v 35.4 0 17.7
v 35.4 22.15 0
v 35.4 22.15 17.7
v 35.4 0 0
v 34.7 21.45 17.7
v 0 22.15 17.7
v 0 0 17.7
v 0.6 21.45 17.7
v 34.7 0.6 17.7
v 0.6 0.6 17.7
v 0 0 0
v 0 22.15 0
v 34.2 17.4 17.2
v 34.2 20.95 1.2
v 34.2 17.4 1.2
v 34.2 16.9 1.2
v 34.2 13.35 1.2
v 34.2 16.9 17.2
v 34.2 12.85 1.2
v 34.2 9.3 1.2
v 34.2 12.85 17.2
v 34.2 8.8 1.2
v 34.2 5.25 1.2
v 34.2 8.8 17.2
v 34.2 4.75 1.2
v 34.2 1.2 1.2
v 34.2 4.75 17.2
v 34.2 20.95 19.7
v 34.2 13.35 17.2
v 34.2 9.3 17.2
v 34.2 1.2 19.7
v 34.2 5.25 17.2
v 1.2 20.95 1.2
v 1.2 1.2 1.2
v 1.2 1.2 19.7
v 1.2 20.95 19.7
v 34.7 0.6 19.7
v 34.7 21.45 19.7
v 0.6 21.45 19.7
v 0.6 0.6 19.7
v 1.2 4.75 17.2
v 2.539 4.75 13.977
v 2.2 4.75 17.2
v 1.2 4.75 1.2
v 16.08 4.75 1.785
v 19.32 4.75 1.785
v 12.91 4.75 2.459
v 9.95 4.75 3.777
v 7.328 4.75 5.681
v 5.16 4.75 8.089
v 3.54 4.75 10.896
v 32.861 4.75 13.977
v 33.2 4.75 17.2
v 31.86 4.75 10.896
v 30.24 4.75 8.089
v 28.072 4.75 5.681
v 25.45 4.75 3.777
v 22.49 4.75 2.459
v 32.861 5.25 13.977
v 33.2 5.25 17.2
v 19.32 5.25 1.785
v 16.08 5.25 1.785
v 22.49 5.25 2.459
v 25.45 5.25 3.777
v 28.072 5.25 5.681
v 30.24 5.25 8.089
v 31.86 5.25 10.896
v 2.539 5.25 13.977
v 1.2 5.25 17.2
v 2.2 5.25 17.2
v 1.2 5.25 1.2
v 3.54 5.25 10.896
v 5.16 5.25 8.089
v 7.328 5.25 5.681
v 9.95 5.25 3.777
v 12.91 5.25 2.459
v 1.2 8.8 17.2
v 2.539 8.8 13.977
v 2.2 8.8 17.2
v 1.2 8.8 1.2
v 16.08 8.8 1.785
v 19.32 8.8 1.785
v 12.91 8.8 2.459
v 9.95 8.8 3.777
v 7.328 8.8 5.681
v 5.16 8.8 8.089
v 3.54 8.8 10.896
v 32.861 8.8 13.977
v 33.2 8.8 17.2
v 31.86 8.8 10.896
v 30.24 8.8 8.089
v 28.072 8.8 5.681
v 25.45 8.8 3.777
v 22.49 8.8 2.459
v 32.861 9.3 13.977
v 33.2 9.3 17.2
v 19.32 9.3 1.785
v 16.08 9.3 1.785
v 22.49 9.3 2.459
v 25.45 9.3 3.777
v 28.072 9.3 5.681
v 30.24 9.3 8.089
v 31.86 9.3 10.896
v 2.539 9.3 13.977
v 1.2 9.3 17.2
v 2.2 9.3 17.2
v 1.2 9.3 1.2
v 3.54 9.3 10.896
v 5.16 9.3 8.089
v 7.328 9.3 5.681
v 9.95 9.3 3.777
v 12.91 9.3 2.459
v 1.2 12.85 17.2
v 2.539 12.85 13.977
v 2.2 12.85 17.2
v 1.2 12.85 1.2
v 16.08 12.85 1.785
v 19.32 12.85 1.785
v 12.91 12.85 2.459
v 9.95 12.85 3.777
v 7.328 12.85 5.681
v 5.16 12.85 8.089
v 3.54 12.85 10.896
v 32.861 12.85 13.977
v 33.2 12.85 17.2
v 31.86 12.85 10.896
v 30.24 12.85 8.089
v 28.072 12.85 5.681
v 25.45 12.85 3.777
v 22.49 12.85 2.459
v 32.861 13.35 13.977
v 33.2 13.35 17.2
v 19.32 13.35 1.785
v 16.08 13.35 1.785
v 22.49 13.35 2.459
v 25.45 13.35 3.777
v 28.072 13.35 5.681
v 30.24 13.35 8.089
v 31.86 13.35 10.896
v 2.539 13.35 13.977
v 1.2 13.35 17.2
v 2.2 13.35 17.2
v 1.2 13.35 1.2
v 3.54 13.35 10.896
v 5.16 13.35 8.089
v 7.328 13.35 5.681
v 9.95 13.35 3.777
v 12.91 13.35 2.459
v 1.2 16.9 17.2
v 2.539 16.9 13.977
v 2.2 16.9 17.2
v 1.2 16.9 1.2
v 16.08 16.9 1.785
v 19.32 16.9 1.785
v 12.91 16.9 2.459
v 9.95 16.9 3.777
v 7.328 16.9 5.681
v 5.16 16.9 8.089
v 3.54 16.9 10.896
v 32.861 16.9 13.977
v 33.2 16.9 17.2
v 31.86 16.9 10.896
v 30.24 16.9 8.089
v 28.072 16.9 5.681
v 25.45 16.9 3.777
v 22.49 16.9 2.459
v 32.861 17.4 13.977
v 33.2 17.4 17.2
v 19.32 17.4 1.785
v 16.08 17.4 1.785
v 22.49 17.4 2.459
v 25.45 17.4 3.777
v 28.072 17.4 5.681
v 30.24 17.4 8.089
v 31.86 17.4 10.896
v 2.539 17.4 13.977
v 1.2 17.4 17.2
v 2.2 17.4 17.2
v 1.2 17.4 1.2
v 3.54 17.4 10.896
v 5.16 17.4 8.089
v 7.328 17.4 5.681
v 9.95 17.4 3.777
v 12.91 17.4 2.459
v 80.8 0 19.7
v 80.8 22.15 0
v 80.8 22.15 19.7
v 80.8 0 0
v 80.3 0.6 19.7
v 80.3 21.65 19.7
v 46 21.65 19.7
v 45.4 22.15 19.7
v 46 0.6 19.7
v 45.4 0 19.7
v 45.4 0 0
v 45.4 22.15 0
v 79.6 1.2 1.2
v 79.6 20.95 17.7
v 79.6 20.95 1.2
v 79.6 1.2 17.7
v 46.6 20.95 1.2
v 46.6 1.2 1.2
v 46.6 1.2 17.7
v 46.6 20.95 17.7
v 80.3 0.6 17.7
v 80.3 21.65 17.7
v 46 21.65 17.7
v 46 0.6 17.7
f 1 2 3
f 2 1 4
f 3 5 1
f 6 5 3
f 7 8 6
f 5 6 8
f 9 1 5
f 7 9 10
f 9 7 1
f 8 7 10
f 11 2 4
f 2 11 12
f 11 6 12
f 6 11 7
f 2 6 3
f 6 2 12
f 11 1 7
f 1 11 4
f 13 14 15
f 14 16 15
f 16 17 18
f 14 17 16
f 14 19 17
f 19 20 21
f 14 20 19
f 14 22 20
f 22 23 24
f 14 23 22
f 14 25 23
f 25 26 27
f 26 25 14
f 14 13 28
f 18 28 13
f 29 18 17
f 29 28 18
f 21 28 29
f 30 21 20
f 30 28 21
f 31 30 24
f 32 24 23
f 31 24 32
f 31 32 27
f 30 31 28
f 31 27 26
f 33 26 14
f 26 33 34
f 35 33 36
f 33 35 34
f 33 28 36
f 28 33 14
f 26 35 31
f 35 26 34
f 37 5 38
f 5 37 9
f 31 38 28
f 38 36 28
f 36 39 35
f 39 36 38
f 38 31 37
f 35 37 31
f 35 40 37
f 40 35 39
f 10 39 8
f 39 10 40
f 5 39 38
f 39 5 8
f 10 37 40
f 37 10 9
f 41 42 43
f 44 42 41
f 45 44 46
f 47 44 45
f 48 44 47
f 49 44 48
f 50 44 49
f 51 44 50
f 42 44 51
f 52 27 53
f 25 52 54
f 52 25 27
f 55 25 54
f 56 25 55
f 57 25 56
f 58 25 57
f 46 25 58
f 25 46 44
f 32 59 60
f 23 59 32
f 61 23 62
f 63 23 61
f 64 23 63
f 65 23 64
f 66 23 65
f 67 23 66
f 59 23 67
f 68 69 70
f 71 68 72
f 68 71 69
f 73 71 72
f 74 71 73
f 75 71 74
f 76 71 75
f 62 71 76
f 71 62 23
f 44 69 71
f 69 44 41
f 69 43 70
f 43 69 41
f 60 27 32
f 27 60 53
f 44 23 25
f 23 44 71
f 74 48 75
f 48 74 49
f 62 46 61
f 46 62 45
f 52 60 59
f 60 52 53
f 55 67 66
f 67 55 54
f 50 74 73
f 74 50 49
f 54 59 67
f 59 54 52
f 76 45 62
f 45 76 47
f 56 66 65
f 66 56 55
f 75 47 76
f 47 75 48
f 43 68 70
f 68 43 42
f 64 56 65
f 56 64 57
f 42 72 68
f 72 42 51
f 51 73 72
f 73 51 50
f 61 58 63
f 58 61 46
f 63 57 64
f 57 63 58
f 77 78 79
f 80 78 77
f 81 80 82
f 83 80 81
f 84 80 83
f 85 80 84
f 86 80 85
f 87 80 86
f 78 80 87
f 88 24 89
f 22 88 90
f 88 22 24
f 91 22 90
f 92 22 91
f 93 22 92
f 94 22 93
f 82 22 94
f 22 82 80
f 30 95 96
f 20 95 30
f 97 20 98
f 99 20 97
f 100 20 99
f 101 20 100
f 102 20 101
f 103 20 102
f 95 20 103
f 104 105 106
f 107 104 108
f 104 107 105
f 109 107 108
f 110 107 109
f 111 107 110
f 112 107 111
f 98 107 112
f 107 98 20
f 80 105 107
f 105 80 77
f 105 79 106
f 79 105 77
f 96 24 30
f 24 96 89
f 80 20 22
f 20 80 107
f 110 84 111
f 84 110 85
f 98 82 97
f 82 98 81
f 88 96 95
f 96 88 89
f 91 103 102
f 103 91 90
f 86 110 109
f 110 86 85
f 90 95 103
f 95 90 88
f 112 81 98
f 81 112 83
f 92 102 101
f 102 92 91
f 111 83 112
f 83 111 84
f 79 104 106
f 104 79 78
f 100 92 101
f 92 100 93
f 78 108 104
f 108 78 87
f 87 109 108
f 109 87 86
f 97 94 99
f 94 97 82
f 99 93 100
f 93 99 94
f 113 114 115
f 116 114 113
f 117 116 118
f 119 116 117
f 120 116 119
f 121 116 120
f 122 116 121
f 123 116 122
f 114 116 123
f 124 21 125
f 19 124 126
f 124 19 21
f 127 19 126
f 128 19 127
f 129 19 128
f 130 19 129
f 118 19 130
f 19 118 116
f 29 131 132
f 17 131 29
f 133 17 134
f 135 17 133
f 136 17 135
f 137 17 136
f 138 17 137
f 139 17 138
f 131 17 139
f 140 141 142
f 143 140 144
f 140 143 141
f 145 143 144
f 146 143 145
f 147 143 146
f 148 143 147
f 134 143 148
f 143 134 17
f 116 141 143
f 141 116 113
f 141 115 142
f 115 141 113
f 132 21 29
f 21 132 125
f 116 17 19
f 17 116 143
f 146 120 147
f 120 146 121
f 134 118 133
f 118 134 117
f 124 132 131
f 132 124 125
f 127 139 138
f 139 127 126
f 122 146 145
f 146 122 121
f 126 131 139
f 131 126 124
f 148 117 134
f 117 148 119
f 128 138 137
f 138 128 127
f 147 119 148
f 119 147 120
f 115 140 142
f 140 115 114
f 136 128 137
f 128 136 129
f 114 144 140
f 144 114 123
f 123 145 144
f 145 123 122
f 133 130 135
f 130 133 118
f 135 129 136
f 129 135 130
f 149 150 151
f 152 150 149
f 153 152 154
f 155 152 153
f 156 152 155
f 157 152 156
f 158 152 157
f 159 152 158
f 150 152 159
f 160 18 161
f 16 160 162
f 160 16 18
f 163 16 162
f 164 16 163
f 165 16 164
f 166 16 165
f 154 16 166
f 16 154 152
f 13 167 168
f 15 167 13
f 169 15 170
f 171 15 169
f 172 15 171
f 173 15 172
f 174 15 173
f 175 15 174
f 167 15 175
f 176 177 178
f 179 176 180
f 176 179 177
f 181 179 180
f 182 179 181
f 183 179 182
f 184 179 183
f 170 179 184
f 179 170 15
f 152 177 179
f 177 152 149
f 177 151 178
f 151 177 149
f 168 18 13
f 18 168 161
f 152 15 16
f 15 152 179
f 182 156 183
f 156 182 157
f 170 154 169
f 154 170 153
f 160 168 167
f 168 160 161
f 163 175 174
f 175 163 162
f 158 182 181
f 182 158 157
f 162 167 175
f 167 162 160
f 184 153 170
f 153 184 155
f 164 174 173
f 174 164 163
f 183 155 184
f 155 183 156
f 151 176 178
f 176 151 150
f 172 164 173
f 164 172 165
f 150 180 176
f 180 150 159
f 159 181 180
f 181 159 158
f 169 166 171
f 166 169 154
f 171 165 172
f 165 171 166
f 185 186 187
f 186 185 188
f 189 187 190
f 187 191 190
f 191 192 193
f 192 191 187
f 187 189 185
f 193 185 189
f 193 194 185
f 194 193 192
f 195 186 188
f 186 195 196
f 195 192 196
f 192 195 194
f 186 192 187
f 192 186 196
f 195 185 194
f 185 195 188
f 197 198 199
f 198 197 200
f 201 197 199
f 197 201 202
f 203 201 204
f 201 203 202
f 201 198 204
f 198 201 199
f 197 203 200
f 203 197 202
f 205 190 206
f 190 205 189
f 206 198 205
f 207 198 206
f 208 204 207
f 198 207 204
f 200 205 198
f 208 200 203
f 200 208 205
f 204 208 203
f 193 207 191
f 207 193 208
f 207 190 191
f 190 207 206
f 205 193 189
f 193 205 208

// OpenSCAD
// Diameter of the capsule
diameter=32.0; //[10.0:0.1:50.0]
// Depth of the capsule
depth=3.05;
// Number of coins per row
coins_row=5;
// Width of the box walls
wall=1.2;

// width of the capsule spacer
separator_width=0.5;
// padding of the capsule diameter (space between the capsule and the walls)
di_padding=1.0;
// padding of the capsule depth (space between the capsule and the separators)
de_padding=0.5;
// tolerance for the box lid
fit_tolerance=0.1;

module separator(){
    difference() {
        cube([diameter+di_padding, diameter/2, separator_width]);
        translate([(diameter+di_padding)/2,diameter/2,0]) cylinder(h=separator_width,d=diameter-di_padding);
    };
}

////////
//Holder
////////

// Base
difference() {
cube([diameter+di_padding+2*wall,(depth+de_padding)*coins_row+separator_width*(coins_row-1)+wall*2,(2*wall+diameter+di_padding)/2]);
translate([wall,wall,wall]) cube([diameter+di_padding,(depth+de_padding)*coins_row+separator_width*(coins_row-1),wall+diameter+di_padding]);
}

// Top ring
difference() {
translate([wall/2,wall/2,(2*wall+diameter+di_padding)/2]) cube([diameter+di_padding+wall-fit_tolerance,(depth+de_padding)*coins_row+separator_width*(coins_row-1)+wall-fit_tolerance,2]);
translate([wall,wall,wall]) cube([diameter+di_padding,(depth+de_padding)*coins_row+separator_width*(coins_row-1),wall+diameter+di_padding]);
}

// Separators
for (i = [1:1:coins_row-1])
{
    translate([wall,wall+(depth+de_padding+separator_width)*i,wall]) rotate([90,0,0]) separator();    
}

////////
// Lid
////////
translate([diameter+di_padding+2*wall+10,0,0]) {
    difference() {
        cube([diameter+di_padding+2*wall,(depth+de_padding)*coins_row+separator_width*(coins_row-1)+wall*2,((2*wall+diameter+di_padding)/2)+2]);
        translate([wall,wall,wall]) cube([diameter+di_padding,(depth+de_padding)*coins_row+separator_width*(coins_row-1),wall+diameter+di_padding]);
        translate([wall/2,wall/2,((2*wall+diameter+di_padding)/2)]) cube([diameter+di_padding+wall+fit_tolerance,(depth+de_padding)*coins_row+separator_width*(coins_row-1)+wall+fit_tolerance,wall+diameter+di_padding]);
    }
}
